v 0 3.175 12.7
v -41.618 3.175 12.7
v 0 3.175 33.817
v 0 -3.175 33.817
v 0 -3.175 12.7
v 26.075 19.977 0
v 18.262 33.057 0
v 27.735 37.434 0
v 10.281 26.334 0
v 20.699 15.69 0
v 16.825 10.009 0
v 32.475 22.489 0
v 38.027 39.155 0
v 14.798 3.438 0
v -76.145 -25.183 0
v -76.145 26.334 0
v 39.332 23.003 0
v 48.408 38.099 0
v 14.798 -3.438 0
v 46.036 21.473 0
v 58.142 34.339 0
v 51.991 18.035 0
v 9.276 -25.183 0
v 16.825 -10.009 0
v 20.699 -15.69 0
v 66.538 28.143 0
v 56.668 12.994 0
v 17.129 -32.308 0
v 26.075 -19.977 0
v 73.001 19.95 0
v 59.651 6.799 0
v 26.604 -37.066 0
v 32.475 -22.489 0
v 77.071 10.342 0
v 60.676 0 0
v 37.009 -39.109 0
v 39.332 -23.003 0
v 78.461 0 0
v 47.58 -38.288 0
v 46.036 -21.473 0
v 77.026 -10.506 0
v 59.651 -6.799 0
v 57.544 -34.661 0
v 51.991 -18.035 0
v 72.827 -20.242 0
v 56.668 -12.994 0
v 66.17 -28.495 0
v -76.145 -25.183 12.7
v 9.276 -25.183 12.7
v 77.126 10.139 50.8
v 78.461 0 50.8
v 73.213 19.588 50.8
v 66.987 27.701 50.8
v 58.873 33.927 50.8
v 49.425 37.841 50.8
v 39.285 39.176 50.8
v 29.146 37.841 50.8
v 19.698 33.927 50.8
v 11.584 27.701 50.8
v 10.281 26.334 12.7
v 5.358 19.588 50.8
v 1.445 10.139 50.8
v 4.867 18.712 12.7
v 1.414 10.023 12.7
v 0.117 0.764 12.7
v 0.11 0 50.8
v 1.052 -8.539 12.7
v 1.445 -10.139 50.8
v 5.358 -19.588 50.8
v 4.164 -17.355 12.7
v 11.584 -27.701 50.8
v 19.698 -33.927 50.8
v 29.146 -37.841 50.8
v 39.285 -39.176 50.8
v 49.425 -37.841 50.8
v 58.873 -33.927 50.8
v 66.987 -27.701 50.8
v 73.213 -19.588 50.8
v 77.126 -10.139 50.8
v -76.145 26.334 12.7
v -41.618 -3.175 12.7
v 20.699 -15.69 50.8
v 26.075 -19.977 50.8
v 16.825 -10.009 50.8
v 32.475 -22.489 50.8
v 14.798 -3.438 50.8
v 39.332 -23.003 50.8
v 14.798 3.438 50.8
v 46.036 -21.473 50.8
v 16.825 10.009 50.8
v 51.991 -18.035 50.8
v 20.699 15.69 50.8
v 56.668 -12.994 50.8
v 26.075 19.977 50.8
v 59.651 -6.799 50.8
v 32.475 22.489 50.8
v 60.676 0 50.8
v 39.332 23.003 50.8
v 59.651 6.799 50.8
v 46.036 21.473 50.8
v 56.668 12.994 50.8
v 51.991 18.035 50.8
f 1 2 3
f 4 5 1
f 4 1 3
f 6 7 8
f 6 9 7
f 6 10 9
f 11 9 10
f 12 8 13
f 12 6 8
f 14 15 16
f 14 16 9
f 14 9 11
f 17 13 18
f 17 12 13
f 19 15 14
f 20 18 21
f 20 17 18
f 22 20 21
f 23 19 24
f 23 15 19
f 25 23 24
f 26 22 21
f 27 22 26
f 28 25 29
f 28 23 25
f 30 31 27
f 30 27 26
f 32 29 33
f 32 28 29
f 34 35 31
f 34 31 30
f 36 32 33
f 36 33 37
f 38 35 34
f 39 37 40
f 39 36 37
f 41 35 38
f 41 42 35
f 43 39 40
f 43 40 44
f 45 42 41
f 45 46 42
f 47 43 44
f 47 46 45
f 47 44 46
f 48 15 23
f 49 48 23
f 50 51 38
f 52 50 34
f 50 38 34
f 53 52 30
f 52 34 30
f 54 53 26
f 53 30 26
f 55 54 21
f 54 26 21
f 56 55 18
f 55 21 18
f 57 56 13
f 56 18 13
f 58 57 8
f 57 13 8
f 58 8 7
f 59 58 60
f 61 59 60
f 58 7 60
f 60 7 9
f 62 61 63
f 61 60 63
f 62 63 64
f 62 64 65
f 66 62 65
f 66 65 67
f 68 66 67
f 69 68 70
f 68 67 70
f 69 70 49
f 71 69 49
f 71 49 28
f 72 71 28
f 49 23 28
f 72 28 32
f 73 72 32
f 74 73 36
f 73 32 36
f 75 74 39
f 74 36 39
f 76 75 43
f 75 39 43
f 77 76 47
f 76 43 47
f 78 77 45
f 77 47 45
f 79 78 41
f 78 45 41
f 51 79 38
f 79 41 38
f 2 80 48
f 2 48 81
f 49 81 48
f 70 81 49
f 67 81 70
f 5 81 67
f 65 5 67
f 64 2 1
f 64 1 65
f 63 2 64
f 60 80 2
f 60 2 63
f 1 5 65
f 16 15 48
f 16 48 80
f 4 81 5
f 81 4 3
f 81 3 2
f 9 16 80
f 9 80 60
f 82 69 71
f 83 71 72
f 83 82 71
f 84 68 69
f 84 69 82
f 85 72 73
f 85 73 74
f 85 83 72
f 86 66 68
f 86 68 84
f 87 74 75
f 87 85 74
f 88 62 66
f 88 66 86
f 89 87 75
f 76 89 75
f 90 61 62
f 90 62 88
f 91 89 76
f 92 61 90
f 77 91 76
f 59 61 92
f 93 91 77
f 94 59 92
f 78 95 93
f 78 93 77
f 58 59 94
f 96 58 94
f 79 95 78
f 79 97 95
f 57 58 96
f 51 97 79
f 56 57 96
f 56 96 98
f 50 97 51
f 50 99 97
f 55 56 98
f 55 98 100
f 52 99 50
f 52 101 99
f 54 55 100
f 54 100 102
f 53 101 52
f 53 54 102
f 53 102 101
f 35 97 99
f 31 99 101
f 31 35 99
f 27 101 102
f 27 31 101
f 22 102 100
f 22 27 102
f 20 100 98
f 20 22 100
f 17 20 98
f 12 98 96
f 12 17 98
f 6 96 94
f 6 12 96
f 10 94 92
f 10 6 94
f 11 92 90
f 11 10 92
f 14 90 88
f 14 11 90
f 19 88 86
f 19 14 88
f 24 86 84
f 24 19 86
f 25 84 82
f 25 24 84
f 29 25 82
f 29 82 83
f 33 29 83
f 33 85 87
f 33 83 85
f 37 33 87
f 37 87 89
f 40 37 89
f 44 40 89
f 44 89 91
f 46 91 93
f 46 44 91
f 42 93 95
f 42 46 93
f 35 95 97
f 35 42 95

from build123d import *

# Parameters (mm, degrees)
F1_DEPTH = 50.8
F2_R     = 23.0676038816
F3_DEPTH = 130.048
F4_W     = 88.9319777489
F4_H     = 51.5172313899
F5_DEPTH = 12.7
F7_DEPTH = 3.175


with BuildPart() as f1:
    # F0 (on Top) → F1 (new body)
    with BuildSketch(Plane.XY):
        with BuildLine():
            ThreePointArc((16.3361351828, -31.75), (57.1135301245, -34.8840355997), (78.4611805258, 0))
            ThreePointArc((78.4611805258, 0), (57.1135301245, 34.8840355997), (16.3361351828, 31.75))
            Line((16.3361351828, 31.75), (29.5000914484, 31.75))
            Line((29.5000914484, 31.75), (29.5000914484, -31.75))
            Line((29.5000914484, -31.75), (16.3361351828, -31.75))
        make_face()
        with BuildLine():
            Line((29.5000914484, 31.75), (16.3361351828, 31.75))
            ThreePointArc((16.3361351828, 31.75), (0.109788877, 0), (16.3361351828, -31.75))
            Line((16.3361351828, -31.75), (29.5000914484, -31.75))
            Line((29.5000914484, -31.75), (29.5000914484, 31.75))
        make_face()
    extrude(amount=F1_DEPTH)

    # F2 (on Top) → F3 (cut)
    with BuildSketch(Plane.XY):
        with Locations((37.608332932, 0)):
            Circle(F2_R)
    extrude(amount=F3_DEPTH, mode=Mode.SUBTRACT)

    # F4 (on Top) → F5 (join)
    with BuildSketch(Plane.XY):
        with Locations((-31.6792652011, 0.5756122991)):
            Rectangle(F4_W, F4_H)
    extrude(amount=F5_DEPTH)

    # F6 (on Front) → F7 (join, symmetric)
    with BuildSketch(Plane.XZ):
        Polygon((0, 0), (0, 33.8171757758), (-66.6476637125, 0), align=None)
    extrude(amount=F7_DEPTH, both=True)


solid = f1.part
